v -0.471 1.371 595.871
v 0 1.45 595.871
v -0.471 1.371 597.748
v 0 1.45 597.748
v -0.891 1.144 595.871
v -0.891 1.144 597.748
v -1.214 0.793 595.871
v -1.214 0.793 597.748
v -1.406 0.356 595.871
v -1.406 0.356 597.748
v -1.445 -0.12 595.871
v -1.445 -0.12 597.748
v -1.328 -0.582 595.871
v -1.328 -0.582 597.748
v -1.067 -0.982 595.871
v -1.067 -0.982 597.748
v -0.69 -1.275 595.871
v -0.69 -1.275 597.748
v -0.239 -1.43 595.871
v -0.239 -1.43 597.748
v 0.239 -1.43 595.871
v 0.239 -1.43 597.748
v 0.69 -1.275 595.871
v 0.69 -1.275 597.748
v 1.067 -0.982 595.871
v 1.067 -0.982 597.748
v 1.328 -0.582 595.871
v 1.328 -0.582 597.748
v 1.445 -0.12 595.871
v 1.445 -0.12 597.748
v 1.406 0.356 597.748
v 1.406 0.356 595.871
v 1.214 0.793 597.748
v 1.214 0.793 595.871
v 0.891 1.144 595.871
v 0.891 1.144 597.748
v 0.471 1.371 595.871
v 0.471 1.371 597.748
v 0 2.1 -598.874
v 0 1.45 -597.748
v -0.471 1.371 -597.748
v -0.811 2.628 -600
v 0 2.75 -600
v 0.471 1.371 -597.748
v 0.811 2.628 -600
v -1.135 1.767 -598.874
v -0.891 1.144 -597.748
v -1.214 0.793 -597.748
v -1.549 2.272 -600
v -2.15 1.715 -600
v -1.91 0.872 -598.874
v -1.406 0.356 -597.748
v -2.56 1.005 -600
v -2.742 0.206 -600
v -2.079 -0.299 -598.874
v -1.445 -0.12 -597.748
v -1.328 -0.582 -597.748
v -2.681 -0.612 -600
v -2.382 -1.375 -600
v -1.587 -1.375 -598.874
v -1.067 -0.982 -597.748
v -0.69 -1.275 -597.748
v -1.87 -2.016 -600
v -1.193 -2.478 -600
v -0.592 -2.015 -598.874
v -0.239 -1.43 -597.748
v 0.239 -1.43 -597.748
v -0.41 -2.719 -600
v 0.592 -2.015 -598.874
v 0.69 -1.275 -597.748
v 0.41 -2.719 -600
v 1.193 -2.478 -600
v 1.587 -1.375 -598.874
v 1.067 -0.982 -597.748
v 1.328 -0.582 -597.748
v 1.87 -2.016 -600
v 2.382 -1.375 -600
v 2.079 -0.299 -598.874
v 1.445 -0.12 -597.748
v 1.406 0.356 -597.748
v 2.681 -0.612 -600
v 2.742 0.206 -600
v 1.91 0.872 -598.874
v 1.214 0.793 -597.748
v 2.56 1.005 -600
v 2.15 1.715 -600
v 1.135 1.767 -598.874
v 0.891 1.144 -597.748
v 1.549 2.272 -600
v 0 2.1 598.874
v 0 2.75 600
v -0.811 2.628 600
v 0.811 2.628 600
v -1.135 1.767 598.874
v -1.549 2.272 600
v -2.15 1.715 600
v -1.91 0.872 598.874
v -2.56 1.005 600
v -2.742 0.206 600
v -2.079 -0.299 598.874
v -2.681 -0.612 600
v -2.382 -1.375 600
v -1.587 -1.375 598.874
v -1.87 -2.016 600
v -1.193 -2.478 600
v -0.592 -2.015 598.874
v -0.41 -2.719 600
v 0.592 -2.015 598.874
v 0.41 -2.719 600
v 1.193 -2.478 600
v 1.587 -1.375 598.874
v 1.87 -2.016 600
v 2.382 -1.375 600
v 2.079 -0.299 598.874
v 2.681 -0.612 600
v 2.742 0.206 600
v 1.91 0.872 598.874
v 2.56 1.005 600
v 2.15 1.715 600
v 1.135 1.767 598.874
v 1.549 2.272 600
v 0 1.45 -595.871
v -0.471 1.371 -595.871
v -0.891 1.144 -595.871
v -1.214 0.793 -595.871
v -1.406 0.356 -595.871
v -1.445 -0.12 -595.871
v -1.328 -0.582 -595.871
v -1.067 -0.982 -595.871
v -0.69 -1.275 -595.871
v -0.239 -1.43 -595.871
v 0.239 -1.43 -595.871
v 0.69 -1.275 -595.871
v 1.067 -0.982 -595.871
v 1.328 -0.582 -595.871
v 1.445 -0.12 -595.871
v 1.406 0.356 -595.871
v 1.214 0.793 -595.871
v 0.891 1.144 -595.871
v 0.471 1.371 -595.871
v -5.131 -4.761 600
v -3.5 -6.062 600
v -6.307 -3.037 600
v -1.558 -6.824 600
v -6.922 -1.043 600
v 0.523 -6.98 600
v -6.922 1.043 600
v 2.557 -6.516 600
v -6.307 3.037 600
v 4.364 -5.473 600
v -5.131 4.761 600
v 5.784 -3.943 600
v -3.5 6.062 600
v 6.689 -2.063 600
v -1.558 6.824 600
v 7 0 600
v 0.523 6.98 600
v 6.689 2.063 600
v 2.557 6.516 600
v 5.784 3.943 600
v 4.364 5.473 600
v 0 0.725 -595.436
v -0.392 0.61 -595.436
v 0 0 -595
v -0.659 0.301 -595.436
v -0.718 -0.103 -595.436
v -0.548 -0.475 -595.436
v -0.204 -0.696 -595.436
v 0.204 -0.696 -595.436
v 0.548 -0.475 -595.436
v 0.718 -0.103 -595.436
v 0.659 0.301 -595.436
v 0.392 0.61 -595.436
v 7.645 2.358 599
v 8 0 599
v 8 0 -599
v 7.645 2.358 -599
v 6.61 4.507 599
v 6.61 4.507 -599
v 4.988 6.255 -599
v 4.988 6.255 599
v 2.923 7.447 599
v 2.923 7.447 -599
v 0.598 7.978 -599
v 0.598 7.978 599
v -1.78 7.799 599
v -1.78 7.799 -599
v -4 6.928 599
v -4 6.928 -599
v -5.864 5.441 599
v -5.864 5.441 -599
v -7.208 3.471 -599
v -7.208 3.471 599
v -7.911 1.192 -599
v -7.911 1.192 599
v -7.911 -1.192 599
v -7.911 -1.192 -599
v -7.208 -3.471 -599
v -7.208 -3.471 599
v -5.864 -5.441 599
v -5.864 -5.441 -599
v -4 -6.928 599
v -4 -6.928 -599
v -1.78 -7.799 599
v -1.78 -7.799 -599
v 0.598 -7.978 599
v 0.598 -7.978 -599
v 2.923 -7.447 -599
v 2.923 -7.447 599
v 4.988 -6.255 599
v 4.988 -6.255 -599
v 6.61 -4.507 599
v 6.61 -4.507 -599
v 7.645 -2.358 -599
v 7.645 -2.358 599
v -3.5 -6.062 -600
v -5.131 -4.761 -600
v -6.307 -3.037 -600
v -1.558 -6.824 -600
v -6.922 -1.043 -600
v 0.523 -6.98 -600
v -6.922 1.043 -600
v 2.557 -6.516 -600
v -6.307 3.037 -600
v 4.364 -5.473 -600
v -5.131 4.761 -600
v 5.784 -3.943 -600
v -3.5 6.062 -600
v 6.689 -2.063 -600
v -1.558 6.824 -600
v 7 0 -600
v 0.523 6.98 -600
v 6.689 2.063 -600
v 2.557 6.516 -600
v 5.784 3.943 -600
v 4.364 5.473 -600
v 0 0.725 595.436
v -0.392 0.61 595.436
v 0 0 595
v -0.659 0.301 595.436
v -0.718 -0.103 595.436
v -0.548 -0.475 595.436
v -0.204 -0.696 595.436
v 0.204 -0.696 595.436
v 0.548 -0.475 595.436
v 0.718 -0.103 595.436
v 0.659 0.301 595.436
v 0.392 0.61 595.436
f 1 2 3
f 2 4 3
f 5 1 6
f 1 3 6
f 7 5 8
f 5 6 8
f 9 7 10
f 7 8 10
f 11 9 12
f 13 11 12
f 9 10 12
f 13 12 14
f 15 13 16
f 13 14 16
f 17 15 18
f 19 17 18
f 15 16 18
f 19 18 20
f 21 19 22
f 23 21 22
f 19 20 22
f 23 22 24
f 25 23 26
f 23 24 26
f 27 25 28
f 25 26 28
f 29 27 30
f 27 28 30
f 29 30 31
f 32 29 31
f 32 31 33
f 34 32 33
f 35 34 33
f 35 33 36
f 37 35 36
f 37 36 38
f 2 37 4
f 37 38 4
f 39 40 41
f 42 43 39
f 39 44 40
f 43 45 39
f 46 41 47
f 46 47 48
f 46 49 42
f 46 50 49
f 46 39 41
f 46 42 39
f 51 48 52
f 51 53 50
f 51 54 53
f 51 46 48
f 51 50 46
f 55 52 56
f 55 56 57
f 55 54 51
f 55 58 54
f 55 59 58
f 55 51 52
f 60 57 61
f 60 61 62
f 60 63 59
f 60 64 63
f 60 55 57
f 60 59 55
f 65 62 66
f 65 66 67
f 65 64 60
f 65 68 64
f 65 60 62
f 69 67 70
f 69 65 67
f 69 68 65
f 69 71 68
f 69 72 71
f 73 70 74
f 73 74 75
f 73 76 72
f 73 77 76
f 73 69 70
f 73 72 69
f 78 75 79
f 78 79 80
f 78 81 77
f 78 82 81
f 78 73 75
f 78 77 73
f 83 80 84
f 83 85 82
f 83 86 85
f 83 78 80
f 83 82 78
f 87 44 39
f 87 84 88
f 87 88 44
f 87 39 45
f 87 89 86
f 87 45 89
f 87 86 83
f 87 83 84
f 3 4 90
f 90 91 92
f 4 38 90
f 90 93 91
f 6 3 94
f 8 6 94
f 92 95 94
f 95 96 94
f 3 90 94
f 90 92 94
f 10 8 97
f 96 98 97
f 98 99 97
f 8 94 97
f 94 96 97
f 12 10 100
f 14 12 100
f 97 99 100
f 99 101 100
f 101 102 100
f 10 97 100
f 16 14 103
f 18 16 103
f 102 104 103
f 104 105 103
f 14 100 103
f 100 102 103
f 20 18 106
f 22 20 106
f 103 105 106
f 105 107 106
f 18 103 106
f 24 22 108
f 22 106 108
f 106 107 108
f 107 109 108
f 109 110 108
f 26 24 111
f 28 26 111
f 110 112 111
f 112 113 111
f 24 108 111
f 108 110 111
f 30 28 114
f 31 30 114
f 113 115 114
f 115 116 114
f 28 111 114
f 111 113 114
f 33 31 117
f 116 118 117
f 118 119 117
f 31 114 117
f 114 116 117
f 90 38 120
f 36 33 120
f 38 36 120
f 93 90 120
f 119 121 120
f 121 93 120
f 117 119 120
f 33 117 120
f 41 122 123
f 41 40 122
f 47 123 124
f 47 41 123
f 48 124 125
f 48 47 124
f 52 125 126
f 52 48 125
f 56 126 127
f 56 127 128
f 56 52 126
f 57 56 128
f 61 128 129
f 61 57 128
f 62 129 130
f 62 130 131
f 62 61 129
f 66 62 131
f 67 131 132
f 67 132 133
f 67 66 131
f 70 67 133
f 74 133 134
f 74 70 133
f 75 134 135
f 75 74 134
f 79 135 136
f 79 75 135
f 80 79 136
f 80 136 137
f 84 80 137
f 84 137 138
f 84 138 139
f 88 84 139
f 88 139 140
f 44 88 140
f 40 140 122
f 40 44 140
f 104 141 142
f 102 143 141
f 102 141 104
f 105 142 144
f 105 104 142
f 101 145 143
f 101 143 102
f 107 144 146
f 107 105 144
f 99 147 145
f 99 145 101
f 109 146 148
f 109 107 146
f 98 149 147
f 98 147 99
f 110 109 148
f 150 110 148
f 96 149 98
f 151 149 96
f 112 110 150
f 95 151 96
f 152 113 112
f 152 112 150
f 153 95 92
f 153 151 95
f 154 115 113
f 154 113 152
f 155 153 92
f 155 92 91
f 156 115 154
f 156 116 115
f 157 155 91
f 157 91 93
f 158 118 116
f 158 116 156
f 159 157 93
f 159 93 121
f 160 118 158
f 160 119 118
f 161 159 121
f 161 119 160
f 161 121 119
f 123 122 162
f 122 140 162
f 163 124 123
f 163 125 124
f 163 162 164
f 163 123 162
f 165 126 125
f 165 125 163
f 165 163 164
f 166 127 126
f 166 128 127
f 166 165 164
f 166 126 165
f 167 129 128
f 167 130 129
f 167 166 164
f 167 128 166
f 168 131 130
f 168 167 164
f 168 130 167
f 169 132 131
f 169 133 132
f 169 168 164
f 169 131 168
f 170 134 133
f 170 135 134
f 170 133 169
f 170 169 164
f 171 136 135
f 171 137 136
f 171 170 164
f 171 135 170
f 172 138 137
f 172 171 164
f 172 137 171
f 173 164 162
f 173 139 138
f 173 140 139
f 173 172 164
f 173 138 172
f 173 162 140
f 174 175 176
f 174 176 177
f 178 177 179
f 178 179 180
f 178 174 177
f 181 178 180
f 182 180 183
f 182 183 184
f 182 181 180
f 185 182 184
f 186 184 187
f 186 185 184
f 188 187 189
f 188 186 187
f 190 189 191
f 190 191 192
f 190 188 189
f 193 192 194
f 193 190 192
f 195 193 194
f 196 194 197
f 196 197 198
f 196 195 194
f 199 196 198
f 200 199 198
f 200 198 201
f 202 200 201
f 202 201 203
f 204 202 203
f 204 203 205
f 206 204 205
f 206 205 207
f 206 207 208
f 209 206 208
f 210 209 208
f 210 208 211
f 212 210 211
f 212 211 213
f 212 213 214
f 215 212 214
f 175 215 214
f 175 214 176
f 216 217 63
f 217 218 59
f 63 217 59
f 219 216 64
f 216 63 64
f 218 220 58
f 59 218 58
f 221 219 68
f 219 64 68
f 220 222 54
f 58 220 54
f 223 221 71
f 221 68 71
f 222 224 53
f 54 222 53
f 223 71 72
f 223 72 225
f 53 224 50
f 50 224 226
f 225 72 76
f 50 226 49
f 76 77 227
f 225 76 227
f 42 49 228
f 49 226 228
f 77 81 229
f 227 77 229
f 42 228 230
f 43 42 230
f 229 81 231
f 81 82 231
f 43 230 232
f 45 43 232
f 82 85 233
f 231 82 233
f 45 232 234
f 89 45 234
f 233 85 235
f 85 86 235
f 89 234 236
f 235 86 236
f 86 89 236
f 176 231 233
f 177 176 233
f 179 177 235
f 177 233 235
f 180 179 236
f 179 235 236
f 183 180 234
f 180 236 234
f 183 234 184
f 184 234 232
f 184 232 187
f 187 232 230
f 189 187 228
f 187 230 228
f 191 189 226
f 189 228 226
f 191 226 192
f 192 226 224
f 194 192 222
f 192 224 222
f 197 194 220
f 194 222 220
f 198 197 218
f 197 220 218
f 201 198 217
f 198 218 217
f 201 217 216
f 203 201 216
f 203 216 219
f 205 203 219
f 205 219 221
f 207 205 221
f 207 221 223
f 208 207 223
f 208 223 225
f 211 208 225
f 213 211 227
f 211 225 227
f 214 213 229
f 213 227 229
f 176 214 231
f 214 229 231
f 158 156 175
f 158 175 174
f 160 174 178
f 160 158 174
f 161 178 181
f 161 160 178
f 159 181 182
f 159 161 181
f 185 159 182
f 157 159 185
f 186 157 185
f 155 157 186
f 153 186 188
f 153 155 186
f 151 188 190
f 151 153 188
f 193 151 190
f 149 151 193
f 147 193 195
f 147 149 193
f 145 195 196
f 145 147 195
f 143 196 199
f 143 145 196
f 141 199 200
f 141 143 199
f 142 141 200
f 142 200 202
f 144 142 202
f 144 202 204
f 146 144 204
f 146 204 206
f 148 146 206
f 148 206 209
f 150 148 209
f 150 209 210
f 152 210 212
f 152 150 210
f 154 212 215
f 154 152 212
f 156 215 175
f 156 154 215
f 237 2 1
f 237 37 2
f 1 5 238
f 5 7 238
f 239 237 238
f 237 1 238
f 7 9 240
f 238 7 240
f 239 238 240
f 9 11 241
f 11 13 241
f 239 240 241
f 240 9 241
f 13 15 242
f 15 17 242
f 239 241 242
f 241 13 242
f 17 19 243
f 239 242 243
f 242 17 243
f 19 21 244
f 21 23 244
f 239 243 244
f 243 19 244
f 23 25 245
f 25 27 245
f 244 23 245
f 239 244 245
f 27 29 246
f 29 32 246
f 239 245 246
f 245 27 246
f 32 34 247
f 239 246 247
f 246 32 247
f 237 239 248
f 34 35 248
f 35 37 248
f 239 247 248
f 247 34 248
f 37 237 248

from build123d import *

# Parameters (mm, degrees)
SKETCH1_R           = 8
BOSS_EXTRUDE1_DEPTH = 600
CHAMFER1_SIZE       = 1


with BuildPart() as part:
    # Sketch1 → Boss-Extrude1 (new, symmetric)
    with BuildSketch(Plane.XY):
        Circle(SKETCH1_R)
    extrude(amount=BOSS_EXTRUDE1_DEPTH, both=True)

    # Sketch4 → CSK for M2.5 Flat Head Machine Screw1 (revolve, cut)
    with BuildSketch(Plane(origin=(0, 0, -600), x_dir=(0, 1, 0), z_dir=(1, 0, 0))):
        Polygon((0, 0), (0, 5), (1.45, 4.128752102), (1.45, 2.25166605), (2.75, 0), align=None)
    csk_for_m2_5_flat_head_machine_screw1 = revolve(axis=Axis((0, 0, -606.35), (0, 0, 1)), mode=Mode.SUBTRACT)

    # Mirror1: CSK for M2.5 Flat Head Machine Screw1 across plane
    add(csk_for_m2_5_flat_head_machine_screw1.mirror(Plane.XY), mode=Mode.SUBTRACT)

    # Chamfer1
    chamfer1_edges = [part.edges().sort_by_distance(p)[0] for p in [
        (-8, 0, -600),
        (-8, 0, 600),
    ]]
    chamfer(chamfer1_edges, length=CHAMFER1_SIZE)


solid = part.part
